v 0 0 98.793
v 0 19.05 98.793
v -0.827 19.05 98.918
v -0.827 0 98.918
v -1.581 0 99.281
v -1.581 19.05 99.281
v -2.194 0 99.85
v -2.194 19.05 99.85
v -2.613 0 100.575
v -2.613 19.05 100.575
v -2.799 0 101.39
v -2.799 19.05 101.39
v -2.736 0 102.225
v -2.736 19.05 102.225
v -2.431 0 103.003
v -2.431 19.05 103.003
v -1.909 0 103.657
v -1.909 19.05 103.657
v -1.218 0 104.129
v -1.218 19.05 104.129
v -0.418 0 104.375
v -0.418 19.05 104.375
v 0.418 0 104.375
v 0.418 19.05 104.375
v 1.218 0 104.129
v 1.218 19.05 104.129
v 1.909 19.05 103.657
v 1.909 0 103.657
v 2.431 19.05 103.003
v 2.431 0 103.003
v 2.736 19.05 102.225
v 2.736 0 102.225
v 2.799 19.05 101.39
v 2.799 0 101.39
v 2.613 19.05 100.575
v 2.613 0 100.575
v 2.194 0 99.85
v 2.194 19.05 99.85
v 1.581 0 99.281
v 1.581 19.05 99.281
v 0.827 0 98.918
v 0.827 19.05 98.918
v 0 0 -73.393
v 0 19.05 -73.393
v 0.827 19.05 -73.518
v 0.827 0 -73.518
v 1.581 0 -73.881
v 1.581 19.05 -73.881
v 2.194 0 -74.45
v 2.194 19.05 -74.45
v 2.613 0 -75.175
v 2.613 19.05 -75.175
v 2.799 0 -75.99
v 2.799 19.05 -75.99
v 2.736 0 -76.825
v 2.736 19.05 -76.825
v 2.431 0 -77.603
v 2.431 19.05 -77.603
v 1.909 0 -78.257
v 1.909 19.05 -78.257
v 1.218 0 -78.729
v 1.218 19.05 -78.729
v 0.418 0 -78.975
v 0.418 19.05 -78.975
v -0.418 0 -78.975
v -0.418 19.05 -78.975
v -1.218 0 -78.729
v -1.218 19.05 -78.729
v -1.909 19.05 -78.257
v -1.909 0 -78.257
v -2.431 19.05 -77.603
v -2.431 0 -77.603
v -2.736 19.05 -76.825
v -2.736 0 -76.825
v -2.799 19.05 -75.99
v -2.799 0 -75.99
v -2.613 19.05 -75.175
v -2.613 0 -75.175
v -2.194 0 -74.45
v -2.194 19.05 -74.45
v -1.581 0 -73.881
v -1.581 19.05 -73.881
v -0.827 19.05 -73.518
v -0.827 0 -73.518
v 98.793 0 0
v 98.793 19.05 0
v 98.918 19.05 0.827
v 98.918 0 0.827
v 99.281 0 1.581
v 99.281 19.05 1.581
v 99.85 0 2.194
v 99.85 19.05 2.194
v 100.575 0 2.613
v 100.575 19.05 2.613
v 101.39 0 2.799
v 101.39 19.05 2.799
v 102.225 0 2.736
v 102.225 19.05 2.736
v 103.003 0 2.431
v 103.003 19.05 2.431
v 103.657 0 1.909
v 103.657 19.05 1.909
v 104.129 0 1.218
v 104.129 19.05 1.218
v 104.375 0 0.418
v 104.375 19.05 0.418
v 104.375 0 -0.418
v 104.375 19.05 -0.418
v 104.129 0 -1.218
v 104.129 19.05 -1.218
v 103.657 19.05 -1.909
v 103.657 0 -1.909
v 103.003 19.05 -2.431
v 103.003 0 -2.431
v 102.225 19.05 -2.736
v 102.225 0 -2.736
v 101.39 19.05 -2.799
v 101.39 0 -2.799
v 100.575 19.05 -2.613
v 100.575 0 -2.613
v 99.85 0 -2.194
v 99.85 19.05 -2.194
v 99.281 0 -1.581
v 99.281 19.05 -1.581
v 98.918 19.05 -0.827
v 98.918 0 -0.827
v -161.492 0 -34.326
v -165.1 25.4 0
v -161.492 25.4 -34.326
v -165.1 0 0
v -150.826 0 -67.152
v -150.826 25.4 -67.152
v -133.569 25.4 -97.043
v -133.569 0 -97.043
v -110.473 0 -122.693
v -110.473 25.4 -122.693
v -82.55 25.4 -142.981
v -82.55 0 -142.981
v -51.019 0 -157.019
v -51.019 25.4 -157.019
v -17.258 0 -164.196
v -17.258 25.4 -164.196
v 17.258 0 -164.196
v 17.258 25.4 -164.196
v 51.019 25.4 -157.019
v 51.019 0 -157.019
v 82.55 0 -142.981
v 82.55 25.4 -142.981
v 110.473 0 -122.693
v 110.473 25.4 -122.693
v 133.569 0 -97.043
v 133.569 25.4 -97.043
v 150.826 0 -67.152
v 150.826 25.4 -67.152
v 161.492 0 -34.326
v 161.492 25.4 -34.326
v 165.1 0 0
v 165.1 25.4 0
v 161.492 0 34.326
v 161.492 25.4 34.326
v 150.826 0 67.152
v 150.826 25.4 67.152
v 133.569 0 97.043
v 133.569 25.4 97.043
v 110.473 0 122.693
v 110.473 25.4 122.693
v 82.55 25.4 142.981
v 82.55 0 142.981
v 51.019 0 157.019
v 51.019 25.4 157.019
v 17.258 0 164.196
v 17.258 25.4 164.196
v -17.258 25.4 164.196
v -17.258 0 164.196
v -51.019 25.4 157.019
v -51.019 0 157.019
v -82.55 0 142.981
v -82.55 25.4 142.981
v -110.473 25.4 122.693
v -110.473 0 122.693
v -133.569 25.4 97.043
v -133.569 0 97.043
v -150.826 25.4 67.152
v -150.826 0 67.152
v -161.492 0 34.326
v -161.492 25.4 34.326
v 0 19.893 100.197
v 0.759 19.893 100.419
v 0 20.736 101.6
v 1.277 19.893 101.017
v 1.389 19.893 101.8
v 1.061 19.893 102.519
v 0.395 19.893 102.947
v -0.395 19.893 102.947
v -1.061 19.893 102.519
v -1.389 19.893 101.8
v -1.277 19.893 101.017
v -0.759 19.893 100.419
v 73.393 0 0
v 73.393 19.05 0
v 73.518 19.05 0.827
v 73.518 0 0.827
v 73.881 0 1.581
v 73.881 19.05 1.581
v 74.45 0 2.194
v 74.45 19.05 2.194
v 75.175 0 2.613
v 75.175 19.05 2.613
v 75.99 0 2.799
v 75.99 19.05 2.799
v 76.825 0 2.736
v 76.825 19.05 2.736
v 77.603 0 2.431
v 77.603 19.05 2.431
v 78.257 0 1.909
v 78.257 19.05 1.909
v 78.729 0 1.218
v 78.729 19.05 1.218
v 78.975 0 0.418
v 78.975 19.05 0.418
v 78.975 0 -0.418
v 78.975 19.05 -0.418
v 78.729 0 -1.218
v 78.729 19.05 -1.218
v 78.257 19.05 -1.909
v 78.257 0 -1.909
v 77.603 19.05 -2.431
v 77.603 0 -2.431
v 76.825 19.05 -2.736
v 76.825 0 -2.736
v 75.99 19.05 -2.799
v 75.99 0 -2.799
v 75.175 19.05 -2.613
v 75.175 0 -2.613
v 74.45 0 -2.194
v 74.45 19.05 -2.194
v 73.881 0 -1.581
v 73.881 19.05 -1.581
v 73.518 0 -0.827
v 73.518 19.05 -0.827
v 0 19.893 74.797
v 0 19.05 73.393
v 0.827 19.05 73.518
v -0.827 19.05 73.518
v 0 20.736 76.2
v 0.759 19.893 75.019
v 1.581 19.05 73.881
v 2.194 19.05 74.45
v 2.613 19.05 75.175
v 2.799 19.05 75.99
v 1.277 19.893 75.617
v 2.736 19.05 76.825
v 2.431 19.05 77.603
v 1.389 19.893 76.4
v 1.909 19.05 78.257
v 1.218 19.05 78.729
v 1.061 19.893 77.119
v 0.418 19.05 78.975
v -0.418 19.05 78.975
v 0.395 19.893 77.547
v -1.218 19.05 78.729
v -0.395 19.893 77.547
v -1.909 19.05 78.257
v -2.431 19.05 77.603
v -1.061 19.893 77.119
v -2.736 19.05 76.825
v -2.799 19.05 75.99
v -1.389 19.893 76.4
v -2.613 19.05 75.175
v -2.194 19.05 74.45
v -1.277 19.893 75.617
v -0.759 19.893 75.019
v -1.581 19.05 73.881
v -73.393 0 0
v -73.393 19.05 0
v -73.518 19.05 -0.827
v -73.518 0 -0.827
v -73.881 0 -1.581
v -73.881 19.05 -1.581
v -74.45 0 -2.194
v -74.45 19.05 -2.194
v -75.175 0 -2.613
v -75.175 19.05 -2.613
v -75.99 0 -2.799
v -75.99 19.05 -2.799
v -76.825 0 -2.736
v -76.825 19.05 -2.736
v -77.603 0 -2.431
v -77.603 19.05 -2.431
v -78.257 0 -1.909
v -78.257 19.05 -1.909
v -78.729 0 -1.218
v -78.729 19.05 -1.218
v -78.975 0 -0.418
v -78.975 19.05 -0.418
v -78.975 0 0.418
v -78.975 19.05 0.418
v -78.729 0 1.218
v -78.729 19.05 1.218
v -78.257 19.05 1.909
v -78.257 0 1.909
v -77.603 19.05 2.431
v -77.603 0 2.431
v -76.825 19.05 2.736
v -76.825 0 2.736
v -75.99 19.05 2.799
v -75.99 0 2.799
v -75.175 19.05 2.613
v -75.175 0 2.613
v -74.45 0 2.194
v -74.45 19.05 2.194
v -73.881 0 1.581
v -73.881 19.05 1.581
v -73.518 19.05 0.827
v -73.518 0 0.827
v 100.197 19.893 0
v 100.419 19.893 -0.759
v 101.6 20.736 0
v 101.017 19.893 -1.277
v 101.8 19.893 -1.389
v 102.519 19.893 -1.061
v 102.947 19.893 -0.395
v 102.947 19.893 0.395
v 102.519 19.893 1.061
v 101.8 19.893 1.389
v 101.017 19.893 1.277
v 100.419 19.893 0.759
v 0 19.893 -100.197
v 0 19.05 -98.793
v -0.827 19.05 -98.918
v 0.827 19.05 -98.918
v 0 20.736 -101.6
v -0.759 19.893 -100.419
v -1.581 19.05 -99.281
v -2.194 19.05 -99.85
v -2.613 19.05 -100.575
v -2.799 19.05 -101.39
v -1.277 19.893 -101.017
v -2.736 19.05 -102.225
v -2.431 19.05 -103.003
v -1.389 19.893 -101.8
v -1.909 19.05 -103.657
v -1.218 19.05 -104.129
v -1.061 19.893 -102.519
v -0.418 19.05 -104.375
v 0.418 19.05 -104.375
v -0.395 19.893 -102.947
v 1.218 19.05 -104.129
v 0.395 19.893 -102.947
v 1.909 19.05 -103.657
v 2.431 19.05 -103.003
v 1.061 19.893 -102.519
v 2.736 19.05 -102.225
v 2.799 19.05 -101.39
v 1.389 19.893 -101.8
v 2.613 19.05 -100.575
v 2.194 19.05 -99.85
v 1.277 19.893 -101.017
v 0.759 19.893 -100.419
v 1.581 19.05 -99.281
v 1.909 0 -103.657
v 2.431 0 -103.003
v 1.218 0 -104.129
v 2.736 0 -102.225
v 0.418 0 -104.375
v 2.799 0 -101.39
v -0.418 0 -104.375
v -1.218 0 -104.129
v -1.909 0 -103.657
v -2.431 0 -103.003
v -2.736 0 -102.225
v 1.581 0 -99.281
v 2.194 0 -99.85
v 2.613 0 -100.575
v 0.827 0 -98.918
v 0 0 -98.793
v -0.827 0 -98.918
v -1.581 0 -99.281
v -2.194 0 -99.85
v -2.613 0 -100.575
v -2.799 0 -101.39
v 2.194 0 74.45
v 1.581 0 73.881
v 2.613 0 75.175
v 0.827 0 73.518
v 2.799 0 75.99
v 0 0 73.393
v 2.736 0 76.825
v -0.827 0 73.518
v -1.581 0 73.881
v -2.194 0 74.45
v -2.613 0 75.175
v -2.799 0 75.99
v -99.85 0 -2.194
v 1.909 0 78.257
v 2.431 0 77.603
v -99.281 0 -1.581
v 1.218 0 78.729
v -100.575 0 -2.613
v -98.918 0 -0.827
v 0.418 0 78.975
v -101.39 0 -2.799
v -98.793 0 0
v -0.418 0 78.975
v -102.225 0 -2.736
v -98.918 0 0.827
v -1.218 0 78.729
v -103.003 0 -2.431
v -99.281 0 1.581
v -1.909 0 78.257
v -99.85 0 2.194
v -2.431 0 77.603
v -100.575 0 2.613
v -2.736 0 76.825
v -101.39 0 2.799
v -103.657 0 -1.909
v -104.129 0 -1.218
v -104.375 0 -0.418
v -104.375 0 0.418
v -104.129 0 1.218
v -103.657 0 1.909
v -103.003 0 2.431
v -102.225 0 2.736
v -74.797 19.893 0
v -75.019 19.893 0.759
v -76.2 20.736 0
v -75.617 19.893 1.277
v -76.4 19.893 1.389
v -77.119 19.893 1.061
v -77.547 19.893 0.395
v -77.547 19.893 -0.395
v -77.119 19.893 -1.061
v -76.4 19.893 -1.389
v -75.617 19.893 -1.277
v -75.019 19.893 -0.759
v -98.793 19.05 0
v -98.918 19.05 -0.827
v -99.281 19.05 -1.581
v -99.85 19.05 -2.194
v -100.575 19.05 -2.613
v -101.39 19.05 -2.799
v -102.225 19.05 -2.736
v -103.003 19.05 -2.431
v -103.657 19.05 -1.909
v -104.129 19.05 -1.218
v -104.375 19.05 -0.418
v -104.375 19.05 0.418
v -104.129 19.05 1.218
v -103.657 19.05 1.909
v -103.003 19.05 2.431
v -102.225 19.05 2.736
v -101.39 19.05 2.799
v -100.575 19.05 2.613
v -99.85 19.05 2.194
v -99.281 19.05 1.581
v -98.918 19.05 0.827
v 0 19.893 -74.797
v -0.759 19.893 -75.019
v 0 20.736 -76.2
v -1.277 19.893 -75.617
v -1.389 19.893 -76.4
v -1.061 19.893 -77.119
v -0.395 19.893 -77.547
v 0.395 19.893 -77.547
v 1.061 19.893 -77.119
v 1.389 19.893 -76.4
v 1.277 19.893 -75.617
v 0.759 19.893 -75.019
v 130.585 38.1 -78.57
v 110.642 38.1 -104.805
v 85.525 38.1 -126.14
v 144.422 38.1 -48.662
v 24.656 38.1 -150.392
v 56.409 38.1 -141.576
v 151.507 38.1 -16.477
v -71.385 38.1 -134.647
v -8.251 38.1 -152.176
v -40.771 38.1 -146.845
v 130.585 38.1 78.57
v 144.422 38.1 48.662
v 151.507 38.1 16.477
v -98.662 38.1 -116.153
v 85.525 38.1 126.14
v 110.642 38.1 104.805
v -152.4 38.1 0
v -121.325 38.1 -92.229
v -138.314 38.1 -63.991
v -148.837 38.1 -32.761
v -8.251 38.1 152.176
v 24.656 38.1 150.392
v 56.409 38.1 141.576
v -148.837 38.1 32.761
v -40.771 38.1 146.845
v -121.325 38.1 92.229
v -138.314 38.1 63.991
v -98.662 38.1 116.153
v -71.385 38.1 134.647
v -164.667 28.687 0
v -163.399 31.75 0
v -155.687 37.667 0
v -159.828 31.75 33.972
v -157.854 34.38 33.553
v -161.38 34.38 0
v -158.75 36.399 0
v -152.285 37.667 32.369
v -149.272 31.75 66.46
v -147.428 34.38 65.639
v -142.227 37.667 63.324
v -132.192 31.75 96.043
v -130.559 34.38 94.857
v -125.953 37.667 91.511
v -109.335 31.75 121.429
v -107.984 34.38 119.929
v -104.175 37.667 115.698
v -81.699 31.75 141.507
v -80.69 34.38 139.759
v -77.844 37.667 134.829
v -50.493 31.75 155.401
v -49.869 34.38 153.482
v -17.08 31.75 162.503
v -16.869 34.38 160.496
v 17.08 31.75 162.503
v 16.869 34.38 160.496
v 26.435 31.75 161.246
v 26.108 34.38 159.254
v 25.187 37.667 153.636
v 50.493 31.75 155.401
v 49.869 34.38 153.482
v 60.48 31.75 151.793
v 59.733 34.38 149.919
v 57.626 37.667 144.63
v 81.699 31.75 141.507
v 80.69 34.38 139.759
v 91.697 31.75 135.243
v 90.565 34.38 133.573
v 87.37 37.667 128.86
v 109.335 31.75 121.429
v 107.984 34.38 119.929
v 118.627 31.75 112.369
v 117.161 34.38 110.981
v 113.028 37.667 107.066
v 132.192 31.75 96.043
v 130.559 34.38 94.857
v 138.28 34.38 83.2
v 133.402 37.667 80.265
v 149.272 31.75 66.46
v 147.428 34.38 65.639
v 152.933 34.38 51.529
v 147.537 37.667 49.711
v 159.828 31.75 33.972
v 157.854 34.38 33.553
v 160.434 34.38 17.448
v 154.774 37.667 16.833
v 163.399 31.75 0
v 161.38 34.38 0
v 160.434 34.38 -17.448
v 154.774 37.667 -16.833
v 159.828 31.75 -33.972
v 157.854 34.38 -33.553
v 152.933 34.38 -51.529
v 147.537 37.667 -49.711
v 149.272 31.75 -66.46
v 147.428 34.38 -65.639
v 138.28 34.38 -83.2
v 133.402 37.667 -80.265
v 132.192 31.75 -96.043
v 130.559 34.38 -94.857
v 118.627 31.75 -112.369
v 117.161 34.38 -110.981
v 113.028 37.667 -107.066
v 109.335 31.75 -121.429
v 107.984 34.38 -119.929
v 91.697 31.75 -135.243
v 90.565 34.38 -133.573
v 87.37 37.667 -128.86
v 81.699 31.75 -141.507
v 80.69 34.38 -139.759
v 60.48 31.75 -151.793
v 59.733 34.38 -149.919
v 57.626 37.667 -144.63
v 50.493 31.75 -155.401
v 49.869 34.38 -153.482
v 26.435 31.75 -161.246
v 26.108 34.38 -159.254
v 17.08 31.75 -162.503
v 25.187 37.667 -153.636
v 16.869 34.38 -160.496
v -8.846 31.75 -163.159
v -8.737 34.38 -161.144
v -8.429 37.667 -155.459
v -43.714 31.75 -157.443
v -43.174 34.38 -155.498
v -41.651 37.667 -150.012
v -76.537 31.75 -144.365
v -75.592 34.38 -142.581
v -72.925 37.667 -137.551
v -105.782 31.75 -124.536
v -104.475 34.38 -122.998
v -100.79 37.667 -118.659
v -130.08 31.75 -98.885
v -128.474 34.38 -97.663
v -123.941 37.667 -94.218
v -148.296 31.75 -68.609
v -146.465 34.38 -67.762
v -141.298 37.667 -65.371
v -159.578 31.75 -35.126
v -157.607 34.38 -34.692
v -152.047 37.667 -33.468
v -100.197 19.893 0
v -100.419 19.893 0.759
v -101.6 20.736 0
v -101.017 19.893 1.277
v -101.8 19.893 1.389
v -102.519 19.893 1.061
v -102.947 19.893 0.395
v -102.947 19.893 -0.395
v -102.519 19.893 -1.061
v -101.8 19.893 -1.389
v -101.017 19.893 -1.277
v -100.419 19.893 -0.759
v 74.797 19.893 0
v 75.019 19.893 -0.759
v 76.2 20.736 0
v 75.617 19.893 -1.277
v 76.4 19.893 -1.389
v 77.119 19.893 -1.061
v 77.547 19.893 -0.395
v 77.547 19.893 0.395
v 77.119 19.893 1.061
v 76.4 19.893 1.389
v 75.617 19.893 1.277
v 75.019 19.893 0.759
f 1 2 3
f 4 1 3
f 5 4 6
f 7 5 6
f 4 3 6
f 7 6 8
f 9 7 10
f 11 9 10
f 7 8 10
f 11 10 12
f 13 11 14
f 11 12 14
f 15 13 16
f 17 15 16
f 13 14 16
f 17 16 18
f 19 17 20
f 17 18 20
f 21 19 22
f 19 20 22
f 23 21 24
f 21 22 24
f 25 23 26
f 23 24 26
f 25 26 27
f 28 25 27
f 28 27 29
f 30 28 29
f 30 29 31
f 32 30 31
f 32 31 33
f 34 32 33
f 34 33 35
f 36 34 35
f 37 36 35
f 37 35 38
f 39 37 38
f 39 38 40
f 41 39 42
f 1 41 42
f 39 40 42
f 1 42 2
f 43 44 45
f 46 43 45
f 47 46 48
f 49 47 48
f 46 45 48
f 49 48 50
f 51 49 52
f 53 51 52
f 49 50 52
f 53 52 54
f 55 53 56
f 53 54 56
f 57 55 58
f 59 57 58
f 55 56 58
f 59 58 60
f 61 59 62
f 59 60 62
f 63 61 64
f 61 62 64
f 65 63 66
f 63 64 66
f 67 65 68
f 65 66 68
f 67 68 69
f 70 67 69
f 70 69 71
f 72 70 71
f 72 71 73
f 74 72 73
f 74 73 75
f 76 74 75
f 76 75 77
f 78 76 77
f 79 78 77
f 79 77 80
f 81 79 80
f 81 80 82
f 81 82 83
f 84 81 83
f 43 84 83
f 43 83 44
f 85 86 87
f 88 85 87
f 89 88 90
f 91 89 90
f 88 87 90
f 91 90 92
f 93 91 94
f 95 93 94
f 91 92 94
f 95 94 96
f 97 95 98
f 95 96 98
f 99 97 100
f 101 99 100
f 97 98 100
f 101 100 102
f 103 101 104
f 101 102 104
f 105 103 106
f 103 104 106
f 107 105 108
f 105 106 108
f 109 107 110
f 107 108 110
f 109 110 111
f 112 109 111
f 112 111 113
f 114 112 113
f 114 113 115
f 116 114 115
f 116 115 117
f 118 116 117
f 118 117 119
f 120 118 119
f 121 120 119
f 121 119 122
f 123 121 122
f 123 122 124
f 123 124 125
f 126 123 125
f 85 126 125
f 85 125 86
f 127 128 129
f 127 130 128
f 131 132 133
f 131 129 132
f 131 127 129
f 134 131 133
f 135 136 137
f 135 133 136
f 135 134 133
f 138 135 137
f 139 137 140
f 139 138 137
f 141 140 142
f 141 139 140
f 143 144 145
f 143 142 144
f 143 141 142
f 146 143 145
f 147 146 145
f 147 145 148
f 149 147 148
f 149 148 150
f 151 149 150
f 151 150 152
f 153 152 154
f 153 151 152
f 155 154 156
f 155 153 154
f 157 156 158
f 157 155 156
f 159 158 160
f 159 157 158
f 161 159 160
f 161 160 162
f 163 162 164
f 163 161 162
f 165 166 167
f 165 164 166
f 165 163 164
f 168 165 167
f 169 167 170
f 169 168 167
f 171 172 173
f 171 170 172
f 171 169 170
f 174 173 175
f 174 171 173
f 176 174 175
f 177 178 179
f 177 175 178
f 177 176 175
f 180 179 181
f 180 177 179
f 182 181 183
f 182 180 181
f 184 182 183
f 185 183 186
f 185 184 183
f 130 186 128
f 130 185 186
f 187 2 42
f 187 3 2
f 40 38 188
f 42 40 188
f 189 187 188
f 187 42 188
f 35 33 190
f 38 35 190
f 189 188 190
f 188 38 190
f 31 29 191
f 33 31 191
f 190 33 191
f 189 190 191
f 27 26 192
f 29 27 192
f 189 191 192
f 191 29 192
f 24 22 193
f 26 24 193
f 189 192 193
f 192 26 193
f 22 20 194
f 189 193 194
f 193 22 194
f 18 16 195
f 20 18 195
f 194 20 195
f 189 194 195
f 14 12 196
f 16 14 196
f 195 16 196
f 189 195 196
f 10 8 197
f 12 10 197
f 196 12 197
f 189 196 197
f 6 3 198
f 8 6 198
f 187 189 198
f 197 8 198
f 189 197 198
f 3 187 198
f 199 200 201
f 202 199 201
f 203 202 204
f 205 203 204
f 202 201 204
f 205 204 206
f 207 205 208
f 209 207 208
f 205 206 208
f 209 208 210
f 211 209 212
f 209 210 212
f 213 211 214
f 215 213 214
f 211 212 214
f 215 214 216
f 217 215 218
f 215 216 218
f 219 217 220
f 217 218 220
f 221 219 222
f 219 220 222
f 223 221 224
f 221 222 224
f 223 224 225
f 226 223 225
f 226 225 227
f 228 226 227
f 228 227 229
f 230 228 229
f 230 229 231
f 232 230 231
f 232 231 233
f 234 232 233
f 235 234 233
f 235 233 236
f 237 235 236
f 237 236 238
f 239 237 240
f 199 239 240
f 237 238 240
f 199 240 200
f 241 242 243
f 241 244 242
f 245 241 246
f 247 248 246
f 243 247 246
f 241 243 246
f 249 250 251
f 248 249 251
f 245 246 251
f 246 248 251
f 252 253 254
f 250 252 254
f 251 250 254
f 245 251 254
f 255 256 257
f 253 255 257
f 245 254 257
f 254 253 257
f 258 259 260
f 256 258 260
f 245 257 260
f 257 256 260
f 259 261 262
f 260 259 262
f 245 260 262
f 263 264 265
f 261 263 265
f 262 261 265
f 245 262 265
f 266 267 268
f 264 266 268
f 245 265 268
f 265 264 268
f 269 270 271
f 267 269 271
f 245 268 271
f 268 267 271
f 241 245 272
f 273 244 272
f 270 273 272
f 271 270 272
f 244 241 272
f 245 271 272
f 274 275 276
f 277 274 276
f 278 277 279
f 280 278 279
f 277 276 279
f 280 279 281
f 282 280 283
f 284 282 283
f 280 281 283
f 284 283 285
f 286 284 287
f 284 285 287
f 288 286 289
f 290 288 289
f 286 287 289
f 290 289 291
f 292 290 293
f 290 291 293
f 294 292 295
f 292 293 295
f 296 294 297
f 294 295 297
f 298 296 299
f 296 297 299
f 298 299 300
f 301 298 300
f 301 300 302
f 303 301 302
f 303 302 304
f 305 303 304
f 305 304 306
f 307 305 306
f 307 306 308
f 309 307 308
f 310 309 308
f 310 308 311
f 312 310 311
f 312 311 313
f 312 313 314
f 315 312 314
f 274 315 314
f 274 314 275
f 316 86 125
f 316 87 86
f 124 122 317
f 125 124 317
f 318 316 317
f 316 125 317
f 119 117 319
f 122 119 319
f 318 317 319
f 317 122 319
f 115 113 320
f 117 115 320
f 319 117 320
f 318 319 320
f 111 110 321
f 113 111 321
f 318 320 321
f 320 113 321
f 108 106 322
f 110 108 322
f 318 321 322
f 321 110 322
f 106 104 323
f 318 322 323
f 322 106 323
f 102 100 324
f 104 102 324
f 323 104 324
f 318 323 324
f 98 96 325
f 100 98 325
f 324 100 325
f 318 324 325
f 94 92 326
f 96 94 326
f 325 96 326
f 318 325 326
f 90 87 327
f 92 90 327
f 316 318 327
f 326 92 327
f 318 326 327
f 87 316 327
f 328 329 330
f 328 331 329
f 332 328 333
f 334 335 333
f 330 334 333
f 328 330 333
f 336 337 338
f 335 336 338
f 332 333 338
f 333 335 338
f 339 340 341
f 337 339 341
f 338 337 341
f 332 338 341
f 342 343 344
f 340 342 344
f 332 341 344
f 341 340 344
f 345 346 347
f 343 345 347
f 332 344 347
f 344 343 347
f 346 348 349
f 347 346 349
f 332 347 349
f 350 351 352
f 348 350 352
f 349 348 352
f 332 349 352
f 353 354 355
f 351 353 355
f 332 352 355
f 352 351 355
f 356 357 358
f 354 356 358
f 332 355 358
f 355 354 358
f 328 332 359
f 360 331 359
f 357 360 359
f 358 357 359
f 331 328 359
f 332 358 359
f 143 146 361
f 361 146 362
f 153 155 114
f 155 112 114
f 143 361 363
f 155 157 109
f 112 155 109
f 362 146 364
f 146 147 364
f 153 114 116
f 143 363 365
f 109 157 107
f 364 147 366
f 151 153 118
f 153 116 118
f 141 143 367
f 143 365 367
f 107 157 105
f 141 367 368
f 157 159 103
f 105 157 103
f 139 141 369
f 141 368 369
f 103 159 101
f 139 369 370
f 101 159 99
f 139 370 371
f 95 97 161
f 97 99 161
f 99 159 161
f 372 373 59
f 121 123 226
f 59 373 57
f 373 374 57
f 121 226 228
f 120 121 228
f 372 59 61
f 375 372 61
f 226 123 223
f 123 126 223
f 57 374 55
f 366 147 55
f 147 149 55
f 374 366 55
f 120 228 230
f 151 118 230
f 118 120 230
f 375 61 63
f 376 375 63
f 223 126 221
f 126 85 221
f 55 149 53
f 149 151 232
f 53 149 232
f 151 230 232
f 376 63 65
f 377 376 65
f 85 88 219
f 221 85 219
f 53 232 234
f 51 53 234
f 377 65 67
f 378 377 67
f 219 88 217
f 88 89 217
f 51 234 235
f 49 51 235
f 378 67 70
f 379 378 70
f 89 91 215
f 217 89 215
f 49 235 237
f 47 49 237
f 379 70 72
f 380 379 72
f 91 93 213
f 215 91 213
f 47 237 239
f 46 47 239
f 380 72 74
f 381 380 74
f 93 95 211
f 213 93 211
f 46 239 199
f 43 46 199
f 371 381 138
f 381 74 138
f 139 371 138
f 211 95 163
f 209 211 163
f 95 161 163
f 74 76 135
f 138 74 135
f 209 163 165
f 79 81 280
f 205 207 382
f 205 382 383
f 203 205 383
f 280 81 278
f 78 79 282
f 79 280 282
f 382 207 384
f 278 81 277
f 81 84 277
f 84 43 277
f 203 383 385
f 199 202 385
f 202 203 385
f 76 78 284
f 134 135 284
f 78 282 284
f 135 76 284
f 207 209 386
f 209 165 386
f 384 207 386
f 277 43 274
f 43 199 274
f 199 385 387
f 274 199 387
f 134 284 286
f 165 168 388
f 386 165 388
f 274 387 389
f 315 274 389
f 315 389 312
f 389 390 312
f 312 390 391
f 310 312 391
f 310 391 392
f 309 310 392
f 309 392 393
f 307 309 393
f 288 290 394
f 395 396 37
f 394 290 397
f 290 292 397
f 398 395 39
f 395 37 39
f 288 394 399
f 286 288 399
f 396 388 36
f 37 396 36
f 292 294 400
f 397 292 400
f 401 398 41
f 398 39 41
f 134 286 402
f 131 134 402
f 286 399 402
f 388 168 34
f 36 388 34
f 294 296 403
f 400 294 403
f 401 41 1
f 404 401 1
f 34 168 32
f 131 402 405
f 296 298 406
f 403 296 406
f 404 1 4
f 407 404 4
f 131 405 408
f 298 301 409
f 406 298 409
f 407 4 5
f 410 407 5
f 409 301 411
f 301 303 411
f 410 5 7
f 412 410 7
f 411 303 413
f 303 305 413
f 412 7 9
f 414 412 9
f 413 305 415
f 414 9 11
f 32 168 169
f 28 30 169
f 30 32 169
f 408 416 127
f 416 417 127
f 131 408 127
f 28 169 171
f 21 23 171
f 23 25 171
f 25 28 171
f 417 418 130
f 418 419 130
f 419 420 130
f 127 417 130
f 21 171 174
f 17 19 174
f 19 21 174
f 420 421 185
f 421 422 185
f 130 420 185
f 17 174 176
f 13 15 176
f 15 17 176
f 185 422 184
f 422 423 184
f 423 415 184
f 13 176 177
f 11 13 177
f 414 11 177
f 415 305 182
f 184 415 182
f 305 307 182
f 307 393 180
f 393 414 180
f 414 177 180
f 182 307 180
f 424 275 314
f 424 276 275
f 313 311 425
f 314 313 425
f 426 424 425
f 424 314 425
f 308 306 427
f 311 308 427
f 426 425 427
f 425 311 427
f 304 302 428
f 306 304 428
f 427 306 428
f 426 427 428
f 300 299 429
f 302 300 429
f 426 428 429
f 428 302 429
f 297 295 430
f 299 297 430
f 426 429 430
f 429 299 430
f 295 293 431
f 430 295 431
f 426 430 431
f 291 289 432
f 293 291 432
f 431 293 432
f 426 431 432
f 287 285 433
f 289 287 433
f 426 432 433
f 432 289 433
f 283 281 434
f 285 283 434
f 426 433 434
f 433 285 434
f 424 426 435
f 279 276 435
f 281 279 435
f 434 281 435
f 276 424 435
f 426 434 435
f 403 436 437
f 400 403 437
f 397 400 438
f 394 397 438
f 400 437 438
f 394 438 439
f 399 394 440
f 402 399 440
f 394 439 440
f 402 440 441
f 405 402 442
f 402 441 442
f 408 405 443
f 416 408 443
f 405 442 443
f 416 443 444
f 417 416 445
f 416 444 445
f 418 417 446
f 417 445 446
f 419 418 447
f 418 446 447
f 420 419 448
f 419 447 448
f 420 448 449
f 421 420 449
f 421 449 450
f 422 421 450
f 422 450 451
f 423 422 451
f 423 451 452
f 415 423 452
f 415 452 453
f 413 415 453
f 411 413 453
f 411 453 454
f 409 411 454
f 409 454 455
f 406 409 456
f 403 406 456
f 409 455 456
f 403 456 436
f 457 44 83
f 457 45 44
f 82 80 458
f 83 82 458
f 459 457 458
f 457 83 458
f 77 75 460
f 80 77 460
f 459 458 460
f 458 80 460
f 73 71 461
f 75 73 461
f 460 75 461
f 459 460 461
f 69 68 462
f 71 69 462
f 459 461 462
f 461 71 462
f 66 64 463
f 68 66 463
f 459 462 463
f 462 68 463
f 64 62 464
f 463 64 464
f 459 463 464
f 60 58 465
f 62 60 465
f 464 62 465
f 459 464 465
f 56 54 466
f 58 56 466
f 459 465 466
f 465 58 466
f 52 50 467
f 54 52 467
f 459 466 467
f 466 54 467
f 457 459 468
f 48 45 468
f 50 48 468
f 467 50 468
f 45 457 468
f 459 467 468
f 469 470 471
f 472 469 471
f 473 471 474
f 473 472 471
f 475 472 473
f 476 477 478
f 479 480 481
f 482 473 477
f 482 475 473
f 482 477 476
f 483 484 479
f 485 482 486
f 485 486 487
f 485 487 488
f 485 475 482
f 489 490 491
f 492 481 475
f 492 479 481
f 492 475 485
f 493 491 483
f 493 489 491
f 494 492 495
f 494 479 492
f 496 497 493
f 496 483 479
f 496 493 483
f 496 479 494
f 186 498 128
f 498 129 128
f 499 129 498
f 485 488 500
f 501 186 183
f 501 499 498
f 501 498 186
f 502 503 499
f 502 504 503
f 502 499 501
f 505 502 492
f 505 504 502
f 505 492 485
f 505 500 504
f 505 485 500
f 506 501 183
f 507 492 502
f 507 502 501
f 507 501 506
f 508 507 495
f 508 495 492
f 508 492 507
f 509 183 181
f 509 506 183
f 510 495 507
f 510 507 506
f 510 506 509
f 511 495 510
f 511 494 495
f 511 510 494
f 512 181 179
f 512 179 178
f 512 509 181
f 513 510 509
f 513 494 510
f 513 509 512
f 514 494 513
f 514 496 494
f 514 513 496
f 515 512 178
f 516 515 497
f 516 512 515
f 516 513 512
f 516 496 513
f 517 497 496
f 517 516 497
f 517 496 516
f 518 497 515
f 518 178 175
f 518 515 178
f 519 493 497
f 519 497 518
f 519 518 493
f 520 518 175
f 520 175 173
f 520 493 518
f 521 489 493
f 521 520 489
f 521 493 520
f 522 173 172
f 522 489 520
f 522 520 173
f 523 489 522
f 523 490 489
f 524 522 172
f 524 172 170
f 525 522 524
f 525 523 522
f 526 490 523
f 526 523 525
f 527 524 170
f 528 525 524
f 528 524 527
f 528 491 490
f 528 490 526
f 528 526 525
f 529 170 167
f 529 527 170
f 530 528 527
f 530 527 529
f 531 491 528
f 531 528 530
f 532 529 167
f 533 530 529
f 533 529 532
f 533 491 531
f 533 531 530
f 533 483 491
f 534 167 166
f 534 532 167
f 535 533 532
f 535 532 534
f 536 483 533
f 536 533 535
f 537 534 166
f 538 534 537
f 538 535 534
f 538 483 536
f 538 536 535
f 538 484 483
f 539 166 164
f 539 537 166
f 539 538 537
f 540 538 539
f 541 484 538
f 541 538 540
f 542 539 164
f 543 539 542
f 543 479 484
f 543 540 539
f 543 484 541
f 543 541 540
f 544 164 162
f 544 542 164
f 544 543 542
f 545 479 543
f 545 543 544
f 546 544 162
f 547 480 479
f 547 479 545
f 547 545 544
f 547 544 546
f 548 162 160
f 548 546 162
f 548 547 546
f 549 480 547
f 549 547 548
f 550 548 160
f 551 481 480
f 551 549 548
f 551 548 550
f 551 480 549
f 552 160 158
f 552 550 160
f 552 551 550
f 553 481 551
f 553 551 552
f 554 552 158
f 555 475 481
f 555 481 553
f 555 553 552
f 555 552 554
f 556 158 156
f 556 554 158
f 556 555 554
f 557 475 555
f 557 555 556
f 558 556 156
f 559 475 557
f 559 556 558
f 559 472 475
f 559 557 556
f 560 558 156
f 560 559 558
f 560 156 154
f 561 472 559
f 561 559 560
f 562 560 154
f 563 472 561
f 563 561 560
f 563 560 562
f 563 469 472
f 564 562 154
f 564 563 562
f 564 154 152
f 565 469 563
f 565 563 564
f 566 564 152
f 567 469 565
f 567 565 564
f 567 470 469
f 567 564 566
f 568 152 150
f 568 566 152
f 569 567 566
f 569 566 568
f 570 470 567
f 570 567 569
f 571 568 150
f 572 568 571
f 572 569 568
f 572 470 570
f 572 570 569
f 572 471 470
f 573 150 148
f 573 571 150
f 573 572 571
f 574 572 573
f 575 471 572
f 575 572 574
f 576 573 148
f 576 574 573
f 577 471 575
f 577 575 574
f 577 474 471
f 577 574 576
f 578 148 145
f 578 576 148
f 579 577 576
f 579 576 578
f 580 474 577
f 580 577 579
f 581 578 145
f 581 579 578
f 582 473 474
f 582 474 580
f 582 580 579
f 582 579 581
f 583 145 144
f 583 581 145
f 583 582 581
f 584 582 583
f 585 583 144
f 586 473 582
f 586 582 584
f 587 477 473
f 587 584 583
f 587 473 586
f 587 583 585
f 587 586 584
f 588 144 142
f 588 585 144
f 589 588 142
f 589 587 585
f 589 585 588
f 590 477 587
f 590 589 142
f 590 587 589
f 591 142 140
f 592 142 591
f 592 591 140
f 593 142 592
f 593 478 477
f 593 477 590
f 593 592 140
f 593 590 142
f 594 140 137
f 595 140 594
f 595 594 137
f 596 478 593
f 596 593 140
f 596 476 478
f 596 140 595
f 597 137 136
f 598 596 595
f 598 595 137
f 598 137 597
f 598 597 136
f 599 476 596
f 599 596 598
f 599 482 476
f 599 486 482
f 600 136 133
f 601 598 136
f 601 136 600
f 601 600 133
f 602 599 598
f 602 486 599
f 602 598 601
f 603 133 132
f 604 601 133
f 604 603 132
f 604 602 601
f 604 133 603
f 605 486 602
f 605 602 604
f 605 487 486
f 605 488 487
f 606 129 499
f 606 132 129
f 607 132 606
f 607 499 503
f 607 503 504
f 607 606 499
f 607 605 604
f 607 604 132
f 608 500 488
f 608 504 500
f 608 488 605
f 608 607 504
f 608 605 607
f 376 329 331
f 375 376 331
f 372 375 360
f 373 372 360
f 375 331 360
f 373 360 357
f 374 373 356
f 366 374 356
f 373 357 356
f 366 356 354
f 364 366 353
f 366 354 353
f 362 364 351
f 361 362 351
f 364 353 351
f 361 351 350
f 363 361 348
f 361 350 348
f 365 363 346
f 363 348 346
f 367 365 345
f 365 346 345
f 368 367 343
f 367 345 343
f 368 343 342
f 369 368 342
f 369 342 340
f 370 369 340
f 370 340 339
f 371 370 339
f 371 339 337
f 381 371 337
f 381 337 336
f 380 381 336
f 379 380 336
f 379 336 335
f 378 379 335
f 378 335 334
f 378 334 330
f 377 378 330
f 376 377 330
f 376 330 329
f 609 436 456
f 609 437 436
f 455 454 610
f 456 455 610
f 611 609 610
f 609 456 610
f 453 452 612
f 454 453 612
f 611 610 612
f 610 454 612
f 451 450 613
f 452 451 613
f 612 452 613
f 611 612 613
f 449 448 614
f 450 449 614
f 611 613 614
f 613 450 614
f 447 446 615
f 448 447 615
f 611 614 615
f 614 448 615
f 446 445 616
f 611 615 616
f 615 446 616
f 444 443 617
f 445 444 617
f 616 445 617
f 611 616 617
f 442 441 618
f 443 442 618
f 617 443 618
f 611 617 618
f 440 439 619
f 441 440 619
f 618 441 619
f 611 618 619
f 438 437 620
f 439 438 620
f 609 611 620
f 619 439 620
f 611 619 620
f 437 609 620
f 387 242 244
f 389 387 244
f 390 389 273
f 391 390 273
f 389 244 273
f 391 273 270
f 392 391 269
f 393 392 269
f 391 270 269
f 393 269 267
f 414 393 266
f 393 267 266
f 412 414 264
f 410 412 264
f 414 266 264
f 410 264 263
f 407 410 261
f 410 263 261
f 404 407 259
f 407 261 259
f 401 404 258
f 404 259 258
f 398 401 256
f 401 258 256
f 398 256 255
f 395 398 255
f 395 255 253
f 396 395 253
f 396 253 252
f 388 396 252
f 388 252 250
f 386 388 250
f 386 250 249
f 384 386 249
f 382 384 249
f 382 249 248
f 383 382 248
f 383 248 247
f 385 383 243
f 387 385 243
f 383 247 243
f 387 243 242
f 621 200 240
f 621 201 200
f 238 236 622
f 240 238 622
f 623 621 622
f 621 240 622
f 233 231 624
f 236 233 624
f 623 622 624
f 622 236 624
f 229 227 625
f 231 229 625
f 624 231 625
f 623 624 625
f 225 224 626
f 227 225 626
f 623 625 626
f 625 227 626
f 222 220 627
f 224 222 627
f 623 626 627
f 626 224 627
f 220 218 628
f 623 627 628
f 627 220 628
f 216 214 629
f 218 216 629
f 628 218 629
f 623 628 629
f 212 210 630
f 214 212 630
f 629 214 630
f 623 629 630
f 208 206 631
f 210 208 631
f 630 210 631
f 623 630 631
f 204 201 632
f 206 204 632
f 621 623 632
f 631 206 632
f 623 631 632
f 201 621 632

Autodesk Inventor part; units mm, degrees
ref_plane "YZ Plane" through (0, 0, 0) normal (1, 0, 0) x (0, 1, 0)
ref_plane "XZ Plane" through (0, 0, 0) normal (0, 1, 0) x (-1, 0, 0)
ref_plane "XY Plane" through (0, 0, 0) normal (0, 0, 1) x (1, 0, 0)
sketch "Sketch1" plane through (0, 0, 0) normal (0, 1, 0) x (-1, 0, 0)
  circle A0 centre (0, 0) radius 165.1
  point P0 (0, 76.2)
  point P1 (0, 101.6)
  dimension "d0" = 330.2
  dimension "d4" = 25.4
  dimension "d5" = 76.2
extrude "Extrusion1" add sketch "Sketch1" along normal blind 38.1
fillet "Fillet1" radius 12.7 1 edges at (165.1, 38.1, 0)
hole "Hole1" at (0, 0, 76.2) at (0, 0, 101.6) direction (0, 1, 0) diameter 5.6134 depth 19.05 tip angle 118 clearance for "Flat Head Machine Screw (82)" size "#12" standard "Ansi Unified Screw Threads"
pattern_circular "Circular Pattern1" count 4 over 360 about axis through (0, -10, 0) along (0, 1, 0) of "Hole1"
properties part number "Seat" material "Wood (Birch)"
